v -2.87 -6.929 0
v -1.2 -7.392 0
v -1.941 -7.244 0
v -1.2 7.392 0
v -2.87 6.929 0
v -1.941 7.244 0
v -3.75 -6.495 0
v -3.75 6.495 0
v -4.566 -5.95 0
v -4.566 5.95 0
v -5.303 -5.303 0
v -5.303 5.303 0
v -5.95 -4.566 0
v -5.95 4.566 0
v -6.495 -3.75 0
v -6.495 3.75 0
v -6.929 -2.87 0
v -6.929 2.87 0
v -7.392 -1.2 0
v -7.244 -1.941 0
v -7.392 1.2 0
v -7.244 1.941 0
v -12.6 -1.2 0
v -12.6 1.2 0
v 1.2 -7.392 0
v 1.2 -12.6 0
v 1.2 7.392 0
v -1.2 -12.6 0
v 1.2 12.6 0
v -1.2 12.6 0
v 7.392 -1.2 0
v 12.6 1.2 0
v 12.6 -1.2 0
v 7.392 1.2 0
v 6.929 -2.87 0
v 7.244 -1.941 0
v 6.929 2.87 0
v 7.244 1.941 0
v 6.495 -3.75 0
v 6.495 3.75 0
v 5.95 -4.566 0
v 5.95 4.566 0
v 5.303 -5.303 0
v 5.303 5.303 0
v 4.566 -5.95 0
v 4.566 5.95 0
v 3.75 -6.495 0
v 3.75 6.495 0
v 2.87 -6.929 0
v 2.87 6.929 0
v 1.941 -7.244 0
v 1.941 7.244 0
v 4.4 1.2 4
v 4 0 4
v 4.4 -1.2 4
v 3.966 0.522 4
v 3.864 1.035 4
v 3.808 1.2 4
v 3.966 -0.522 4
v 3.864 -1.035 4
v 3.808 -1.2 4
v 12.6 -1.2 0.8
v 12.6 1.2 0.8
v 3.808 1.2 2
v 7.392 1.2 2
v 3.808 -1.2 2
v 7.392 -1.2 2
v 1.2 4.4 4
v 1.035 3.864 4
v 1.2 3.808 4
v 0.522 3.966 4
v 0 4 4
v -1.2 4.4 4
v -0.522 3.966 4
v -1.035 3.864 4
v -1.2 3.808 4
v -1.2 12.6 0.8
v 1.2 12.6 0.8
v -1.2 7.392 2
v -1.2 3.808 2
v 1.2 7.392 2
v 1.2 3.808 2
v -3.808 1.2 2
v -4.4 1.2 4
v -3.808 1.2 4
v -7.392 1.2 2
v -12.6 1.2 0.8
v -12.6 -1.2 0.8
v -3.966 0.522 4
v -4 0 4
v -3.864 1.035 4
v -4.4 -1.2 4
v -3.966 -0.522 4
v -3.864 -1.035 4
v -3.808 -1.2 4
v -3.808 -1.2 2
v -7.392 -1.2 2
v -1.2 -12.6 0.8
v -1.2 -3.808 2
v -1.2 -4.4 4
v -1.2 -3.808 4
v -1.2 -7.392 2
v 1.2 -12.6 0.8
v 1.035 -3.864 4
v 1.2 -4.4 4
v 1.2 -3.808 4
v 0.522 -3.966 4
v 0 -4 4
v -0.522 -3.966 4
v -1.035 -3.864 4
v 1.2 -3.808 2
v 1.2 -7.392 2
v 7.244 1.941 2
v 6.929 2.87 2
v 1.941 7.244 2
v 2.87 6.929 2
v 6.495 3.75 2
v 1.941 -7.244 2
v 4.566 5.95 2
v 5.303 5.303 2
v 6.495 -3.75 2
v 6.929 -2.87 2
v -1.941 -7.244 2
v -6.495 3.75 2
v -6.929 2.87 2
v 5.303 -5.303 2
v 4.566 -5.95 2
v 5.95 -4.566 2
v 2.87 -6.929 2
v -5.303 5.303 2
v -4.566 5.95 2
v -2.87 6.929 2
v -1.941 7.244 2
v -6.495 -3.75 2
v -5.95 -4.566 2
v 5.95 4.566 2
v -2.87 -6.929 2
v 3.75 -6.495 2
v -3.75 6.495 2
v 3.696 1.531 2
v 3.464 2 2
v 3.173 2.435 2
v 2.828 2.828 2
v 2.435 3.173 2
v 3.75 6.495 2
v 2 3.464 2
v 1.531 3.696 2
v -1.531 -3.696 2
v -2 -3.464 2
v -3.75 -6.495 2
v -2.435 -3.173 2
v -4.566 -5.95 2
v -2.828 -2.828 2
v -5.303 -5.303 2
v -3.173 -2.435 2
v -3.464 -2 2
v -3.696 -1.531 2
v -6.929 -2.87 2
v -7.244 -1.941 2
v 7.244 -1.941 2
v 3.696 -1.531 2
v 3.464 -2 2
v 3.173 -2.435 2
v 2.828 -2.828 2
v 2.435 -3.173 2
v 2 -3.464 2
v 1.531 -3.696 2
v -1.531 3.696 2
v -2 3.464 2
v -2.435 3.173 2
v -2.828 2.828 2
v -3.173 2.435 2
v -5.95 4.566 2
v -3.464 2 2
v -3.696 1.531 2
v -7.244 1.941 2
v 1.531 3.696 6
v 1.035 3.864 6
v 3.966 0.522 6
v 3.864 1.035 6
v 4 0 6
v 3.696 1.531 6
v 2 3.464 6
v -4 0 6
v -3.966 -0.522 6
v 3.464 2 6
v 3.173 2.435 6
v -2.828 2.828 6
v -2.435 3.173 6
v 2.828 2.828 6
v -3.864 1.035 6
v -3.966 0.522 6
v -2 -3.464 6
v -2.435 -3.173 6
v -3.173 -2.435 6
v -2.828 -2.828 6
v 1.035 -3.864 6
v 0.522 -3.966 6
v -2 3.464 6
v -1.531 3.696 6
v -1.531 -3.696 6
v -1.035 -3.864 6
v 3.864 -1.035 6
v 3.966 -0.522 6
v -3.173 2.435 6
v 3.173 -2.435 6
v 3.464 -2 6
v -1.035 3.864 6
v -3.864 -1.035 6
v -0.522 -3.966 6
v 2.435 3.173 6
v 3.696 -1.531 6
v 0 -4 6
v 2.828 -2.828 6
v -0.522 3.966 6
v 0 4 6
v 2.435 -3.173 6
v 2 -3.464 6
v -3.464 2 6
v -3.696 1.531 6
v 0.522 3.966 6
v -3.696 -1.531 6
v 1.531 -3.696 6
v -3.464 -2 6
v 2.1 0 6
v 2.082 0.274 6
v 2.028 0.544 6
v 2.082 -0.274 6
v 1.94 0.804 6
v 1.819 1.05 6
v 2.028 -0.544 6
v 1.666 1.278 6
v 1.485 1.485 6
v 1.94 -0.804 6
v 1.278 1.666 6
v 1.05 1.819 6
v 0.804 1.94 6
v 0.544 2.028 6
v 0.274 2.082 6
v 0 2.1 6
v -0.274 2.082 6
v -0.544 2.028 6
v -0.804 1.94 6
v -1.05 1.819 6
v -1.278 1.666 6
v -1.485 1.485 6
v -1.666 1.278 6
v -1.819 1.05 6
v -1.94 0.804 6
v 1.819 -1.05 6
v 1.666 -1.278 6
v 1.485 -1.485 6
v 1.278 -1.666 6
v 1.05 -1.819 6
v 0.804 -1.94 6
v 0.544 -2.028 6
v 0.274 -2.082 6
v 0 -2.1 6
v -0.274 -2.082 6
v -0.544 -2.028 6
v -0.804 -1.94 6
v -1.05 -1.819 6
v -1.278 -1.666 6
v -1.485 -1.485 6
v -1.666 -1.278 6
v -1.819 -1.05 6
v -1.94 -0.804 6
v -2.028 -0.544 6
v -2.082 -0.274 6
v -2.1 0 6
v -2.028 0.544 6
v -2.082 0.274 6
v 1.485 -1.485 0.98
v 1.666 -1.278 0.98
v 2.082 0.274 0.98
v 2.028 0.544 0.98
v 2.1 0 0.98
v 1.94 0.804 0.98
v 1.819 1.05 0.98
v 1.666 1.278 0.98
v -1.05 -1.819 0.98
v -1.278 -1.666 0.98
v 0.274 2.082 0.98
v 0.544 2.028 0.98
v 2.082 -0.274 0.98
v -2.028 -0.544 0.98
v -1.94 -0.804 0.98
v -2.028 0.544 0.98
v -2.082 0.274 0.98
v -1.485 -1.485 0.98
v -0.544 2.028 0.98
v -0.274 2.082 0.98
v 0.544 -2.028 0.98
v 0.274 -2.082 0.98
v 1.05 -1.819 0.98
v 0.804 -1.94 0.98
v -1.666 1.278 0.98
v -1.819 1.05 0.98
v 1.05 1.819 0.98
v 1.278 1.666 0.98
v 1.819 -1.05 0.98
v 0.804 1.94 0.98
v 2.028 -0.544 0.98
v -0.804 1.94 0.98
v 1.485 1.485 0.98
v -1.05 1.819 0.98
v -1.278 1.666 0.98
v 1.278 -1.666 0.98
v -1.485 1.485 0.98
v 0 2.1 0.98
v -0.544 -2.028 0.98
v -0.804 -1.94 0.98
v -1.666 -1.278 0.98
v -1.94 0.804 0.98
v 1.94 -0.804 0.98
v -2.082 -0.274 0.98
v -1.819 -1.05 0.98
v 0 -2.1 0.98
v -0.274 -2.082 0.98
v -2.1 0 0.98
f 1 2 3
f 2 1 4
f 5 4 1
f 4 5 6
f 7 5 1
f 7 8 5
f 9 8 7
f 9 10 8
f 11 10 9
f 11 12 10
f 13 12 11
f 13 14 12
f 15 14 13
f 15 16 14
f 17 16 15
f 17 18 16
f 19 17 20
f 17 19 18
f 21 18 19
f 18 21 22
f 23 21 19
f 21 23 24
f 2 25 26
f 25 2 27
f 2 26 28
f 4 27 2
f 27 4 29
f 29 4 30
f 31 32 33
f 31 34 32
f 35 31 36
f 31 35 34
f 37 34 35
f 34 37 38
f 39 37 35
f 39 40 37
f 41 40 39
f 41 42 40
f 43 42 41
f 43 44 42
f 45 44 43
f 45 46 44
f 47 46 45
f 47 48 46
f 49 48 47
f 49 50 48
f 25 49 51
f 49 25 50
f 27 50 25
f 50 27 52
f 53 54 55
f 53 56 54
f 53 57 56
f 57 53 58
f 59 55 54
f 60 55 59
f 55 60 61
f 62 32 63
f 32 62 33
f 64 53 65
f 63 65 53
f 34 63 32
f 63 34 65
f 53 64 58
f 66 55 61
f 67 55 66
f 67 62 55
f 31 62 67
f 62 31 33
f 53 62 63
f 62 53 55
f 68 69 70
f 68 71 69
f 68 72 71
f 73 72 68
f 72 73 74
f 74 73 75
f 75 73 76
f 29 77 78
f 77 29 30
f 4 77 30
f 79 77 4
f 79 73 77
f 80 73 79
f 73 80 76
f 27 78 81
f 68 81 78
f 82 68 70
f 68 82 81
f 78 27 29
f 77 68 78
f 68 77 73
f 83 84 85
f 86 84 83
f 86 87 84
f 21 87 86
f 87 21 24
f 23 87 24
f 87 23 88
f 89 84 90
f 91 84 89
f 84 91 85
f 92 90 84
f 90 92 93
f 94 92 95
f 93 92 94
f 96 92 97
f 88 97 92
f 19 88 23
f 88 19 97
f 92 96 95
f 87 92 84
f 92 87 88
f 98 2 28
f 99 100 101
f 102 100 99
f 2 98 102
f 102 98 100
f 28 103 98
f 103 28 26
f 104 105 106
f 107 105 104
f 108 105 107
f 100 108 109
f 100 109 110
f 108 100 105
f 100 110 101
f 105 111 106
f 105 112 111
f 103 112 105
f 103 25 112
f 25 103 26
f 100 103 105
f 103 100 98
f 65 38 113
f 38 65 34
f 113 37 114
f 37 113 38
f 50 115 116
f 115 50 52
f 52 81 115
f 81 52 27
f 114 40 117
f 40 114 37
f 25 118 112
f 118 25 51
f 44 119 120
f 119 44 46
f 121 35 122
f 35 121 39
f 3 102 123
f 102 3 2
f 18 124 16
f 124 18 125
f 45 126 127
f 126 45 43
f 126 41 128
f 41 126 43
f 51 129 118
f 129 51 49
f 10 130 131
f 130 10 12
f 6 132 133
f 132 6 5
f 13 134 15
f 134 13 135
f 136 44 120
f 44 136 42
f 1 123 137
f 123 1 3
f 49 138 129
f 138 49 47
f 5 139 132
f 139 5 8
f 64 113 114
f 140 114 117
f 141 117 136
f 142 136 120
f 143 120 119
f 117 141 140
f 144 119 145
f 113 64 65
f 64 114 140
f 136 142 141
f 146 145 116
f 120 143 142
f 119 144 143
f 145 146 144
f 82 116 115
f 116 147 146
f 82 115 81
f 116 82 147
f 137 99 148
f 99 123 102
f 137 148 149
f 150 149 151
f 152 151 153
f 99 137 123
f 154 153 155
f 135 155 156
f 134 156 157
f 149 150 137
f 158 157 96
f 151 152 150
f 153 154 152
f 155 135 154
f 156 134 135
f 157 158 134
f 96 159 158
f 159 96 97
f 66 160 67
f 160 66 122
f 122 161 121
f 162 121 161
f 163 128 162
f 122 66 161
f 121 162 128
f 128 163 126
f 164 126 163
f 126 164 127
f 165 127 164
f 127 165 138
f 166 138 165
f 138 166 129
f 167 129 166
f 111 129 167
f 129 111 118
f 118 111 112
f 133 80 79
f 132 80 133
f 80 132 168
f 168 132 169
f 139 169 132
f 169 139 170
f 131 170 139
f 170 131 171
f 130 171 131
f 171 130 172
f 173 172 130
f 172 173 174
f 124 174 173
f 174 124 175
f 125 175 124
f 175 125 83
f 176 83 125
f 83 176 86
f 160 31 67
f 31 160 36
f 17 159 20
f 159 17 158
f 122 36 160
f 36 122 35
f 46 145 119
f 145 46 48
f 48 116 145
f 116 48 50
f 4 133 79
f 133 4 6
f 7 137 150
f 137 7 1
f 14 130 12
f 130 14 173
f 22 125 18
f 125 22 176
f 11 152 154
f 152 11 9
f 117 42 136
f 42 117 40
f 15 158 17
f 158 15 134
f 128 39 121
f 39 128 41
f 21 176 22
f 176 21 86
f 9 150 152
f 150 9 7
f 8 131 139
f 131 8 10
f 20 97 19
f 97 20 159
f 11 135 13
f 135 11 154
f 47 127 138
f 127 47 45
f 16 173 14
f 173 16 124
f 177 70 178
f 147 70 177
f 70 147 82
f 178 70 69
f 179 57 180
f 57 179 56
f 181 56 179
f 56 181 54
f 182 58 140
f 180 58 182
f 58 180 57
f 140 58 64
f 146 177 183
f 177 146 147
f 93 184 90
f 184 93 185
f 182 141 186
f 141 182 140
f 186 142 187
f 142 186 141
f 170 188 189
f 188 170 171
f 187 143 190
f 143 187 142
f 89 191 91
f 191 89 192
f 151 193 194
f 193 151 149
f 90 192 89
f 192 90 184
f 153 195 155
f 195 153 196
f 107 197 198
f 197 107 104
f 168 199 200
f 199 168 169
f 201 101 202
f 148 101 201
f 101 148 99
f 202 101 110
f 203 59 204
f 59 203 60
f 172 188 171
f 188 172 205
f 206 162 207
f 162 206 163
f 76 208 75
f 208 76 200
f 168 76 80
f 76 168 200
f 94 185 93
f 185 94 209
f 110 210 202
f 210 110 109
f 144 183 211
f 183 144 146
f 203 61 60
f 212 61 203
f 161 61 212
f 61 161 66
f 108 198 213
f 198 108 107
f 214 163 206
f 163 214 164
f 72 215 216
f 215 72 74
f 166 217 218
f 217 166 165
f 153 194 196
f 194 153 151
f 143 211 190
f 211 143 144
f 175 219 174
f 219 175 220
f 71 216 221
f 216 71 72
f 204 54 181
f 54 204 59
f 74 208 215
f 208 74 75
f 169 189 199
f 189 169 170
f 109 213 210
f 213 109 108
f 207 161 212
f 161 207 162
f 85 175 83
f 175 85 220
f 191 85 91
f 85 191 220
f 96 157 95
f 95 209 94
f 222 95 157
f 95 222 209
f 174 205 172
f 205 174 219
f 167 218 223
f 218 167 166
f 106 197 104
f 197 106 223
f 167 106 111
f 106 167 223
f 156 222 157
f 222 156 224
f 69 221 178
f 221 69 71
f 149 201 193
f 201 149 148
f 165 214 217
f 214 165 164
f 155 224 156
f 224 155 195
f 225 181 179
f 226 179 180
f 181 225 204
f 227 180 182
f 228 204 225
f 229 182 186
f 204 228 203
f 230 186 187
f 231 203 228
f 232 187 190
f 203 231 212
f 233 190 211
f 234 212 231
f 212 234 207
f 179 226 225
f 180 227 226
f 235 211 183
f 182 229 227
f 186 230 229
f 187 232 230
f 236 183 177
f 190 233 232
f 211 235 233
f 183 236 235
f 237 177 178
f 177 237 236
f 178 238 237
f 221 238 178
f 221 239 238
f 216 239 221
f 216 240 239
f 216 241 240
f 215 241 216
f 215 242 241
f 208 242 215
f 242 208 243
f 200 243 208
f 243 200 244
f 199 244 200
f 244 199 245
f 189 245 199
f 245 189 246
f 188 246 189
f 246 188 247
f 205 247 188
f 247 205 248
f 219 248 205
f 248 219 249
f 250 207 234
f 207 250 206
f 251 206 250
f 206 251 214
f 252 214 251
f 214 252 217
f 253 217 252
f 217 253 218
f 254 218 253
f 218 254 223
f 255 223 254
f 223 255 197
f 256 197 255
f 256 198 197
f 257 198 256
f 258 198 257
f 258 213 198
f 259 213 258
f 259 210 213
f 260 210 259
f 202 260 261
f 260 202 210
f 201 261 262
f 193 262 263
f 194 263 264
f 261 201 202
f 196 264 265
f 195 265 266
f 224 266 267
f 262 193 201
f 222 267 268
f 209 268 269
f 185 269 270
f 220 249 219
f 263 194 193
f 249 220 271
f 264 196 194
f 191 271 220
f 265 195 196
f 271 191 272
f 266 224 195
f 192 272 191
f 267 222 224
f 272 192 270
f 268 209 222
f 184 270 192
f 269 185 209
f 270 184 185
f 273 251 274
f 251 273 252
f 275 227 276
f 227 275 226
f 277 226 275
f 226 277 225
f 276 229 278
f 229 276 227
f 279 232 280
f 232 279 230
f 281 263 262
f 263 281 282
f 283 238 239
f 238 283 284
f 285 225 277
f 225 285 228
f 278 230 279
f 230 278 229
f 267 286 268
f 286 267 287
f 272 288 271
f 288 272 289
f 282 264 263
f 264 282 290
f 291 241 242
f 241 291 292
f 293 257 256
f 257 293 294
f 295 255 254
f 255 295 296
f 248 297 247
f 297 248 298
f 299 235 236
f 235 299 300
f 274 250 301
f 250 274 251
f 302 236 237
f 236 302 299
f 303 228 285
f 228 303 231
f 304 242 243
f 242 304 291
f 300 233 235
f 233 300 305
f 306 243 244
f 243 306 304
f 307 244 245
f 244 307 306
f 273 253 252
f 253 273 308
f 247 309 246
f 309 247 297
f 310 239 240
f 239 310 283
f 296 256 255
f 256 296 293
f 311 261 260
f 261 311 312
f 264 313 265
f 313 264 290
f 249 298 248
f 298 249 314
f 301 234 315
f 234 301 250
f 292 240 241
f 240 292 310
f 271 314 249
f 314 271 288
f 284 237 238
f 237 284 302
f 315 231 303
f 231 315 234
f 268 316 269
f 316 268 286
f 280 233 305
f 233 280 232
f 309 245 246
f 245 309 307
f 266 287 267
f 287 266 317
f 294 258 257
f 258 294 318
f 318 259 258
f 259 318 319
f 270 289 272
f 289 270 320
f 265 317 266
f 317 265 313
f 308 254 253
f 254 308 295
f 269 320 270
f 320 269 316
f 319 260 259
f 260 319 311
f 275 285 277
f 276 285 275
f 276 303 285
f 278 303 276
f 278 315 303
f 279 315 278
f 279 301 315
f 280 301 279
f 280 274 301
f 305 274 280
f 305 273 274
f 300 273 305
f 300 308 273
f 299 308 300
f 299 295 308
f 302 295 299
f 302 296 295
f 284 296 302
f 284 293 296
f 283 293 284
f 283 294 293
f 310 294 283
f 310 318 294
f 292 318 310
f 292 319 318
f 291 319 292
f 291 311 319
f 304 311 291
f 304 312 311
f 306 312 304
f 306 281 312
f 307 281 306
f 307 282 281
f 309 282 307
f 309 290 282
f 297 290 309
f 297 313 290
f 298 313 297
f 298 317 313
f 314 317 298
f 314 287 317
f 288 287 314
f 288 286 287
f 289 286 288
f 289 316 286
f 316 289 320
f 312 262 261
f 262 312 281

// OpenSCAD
// Heat-set insert boss with base pad and ribs.

$fn = 48;

boss_height = 6;
boss_outer_diameter = 8;
insert_hole_diameter = 4.2;
insert_depth = 5;
base_diameter = 15;
base_height = 2;
rib_length = 8;
rib_width = 2.4;
rib_height = 4;

module tapered_rib(angle) {
    rotate([0, 0, angle])
        hull() {
            translate([boss_outer_diameter / 2 - 0.2, -rib_width / 2, 0])
                cube([0.6, rib_width, rib_height]);
            translate([boss_outer_diameter / 2 + rib_length, -rib_width / 2, 0])
                cube([0.6, rib_width, 0.8]);
        }
}

module insert_boss() {
    difference() {
        union() {
            cylinder(h = base_height, d = base_diameter);
            cylinder(h = boss_height, d = boss_outer_diameter);
            for (a = [0, 90, 180, 270])
                tapered_rib(a);
        }
        translate([0, 0, boss_height - insert_depth - 0.02])
            cylinder(h = insert_depth + 0.05, d = insert_hole_diameter);
    }
}

insert_boss();
